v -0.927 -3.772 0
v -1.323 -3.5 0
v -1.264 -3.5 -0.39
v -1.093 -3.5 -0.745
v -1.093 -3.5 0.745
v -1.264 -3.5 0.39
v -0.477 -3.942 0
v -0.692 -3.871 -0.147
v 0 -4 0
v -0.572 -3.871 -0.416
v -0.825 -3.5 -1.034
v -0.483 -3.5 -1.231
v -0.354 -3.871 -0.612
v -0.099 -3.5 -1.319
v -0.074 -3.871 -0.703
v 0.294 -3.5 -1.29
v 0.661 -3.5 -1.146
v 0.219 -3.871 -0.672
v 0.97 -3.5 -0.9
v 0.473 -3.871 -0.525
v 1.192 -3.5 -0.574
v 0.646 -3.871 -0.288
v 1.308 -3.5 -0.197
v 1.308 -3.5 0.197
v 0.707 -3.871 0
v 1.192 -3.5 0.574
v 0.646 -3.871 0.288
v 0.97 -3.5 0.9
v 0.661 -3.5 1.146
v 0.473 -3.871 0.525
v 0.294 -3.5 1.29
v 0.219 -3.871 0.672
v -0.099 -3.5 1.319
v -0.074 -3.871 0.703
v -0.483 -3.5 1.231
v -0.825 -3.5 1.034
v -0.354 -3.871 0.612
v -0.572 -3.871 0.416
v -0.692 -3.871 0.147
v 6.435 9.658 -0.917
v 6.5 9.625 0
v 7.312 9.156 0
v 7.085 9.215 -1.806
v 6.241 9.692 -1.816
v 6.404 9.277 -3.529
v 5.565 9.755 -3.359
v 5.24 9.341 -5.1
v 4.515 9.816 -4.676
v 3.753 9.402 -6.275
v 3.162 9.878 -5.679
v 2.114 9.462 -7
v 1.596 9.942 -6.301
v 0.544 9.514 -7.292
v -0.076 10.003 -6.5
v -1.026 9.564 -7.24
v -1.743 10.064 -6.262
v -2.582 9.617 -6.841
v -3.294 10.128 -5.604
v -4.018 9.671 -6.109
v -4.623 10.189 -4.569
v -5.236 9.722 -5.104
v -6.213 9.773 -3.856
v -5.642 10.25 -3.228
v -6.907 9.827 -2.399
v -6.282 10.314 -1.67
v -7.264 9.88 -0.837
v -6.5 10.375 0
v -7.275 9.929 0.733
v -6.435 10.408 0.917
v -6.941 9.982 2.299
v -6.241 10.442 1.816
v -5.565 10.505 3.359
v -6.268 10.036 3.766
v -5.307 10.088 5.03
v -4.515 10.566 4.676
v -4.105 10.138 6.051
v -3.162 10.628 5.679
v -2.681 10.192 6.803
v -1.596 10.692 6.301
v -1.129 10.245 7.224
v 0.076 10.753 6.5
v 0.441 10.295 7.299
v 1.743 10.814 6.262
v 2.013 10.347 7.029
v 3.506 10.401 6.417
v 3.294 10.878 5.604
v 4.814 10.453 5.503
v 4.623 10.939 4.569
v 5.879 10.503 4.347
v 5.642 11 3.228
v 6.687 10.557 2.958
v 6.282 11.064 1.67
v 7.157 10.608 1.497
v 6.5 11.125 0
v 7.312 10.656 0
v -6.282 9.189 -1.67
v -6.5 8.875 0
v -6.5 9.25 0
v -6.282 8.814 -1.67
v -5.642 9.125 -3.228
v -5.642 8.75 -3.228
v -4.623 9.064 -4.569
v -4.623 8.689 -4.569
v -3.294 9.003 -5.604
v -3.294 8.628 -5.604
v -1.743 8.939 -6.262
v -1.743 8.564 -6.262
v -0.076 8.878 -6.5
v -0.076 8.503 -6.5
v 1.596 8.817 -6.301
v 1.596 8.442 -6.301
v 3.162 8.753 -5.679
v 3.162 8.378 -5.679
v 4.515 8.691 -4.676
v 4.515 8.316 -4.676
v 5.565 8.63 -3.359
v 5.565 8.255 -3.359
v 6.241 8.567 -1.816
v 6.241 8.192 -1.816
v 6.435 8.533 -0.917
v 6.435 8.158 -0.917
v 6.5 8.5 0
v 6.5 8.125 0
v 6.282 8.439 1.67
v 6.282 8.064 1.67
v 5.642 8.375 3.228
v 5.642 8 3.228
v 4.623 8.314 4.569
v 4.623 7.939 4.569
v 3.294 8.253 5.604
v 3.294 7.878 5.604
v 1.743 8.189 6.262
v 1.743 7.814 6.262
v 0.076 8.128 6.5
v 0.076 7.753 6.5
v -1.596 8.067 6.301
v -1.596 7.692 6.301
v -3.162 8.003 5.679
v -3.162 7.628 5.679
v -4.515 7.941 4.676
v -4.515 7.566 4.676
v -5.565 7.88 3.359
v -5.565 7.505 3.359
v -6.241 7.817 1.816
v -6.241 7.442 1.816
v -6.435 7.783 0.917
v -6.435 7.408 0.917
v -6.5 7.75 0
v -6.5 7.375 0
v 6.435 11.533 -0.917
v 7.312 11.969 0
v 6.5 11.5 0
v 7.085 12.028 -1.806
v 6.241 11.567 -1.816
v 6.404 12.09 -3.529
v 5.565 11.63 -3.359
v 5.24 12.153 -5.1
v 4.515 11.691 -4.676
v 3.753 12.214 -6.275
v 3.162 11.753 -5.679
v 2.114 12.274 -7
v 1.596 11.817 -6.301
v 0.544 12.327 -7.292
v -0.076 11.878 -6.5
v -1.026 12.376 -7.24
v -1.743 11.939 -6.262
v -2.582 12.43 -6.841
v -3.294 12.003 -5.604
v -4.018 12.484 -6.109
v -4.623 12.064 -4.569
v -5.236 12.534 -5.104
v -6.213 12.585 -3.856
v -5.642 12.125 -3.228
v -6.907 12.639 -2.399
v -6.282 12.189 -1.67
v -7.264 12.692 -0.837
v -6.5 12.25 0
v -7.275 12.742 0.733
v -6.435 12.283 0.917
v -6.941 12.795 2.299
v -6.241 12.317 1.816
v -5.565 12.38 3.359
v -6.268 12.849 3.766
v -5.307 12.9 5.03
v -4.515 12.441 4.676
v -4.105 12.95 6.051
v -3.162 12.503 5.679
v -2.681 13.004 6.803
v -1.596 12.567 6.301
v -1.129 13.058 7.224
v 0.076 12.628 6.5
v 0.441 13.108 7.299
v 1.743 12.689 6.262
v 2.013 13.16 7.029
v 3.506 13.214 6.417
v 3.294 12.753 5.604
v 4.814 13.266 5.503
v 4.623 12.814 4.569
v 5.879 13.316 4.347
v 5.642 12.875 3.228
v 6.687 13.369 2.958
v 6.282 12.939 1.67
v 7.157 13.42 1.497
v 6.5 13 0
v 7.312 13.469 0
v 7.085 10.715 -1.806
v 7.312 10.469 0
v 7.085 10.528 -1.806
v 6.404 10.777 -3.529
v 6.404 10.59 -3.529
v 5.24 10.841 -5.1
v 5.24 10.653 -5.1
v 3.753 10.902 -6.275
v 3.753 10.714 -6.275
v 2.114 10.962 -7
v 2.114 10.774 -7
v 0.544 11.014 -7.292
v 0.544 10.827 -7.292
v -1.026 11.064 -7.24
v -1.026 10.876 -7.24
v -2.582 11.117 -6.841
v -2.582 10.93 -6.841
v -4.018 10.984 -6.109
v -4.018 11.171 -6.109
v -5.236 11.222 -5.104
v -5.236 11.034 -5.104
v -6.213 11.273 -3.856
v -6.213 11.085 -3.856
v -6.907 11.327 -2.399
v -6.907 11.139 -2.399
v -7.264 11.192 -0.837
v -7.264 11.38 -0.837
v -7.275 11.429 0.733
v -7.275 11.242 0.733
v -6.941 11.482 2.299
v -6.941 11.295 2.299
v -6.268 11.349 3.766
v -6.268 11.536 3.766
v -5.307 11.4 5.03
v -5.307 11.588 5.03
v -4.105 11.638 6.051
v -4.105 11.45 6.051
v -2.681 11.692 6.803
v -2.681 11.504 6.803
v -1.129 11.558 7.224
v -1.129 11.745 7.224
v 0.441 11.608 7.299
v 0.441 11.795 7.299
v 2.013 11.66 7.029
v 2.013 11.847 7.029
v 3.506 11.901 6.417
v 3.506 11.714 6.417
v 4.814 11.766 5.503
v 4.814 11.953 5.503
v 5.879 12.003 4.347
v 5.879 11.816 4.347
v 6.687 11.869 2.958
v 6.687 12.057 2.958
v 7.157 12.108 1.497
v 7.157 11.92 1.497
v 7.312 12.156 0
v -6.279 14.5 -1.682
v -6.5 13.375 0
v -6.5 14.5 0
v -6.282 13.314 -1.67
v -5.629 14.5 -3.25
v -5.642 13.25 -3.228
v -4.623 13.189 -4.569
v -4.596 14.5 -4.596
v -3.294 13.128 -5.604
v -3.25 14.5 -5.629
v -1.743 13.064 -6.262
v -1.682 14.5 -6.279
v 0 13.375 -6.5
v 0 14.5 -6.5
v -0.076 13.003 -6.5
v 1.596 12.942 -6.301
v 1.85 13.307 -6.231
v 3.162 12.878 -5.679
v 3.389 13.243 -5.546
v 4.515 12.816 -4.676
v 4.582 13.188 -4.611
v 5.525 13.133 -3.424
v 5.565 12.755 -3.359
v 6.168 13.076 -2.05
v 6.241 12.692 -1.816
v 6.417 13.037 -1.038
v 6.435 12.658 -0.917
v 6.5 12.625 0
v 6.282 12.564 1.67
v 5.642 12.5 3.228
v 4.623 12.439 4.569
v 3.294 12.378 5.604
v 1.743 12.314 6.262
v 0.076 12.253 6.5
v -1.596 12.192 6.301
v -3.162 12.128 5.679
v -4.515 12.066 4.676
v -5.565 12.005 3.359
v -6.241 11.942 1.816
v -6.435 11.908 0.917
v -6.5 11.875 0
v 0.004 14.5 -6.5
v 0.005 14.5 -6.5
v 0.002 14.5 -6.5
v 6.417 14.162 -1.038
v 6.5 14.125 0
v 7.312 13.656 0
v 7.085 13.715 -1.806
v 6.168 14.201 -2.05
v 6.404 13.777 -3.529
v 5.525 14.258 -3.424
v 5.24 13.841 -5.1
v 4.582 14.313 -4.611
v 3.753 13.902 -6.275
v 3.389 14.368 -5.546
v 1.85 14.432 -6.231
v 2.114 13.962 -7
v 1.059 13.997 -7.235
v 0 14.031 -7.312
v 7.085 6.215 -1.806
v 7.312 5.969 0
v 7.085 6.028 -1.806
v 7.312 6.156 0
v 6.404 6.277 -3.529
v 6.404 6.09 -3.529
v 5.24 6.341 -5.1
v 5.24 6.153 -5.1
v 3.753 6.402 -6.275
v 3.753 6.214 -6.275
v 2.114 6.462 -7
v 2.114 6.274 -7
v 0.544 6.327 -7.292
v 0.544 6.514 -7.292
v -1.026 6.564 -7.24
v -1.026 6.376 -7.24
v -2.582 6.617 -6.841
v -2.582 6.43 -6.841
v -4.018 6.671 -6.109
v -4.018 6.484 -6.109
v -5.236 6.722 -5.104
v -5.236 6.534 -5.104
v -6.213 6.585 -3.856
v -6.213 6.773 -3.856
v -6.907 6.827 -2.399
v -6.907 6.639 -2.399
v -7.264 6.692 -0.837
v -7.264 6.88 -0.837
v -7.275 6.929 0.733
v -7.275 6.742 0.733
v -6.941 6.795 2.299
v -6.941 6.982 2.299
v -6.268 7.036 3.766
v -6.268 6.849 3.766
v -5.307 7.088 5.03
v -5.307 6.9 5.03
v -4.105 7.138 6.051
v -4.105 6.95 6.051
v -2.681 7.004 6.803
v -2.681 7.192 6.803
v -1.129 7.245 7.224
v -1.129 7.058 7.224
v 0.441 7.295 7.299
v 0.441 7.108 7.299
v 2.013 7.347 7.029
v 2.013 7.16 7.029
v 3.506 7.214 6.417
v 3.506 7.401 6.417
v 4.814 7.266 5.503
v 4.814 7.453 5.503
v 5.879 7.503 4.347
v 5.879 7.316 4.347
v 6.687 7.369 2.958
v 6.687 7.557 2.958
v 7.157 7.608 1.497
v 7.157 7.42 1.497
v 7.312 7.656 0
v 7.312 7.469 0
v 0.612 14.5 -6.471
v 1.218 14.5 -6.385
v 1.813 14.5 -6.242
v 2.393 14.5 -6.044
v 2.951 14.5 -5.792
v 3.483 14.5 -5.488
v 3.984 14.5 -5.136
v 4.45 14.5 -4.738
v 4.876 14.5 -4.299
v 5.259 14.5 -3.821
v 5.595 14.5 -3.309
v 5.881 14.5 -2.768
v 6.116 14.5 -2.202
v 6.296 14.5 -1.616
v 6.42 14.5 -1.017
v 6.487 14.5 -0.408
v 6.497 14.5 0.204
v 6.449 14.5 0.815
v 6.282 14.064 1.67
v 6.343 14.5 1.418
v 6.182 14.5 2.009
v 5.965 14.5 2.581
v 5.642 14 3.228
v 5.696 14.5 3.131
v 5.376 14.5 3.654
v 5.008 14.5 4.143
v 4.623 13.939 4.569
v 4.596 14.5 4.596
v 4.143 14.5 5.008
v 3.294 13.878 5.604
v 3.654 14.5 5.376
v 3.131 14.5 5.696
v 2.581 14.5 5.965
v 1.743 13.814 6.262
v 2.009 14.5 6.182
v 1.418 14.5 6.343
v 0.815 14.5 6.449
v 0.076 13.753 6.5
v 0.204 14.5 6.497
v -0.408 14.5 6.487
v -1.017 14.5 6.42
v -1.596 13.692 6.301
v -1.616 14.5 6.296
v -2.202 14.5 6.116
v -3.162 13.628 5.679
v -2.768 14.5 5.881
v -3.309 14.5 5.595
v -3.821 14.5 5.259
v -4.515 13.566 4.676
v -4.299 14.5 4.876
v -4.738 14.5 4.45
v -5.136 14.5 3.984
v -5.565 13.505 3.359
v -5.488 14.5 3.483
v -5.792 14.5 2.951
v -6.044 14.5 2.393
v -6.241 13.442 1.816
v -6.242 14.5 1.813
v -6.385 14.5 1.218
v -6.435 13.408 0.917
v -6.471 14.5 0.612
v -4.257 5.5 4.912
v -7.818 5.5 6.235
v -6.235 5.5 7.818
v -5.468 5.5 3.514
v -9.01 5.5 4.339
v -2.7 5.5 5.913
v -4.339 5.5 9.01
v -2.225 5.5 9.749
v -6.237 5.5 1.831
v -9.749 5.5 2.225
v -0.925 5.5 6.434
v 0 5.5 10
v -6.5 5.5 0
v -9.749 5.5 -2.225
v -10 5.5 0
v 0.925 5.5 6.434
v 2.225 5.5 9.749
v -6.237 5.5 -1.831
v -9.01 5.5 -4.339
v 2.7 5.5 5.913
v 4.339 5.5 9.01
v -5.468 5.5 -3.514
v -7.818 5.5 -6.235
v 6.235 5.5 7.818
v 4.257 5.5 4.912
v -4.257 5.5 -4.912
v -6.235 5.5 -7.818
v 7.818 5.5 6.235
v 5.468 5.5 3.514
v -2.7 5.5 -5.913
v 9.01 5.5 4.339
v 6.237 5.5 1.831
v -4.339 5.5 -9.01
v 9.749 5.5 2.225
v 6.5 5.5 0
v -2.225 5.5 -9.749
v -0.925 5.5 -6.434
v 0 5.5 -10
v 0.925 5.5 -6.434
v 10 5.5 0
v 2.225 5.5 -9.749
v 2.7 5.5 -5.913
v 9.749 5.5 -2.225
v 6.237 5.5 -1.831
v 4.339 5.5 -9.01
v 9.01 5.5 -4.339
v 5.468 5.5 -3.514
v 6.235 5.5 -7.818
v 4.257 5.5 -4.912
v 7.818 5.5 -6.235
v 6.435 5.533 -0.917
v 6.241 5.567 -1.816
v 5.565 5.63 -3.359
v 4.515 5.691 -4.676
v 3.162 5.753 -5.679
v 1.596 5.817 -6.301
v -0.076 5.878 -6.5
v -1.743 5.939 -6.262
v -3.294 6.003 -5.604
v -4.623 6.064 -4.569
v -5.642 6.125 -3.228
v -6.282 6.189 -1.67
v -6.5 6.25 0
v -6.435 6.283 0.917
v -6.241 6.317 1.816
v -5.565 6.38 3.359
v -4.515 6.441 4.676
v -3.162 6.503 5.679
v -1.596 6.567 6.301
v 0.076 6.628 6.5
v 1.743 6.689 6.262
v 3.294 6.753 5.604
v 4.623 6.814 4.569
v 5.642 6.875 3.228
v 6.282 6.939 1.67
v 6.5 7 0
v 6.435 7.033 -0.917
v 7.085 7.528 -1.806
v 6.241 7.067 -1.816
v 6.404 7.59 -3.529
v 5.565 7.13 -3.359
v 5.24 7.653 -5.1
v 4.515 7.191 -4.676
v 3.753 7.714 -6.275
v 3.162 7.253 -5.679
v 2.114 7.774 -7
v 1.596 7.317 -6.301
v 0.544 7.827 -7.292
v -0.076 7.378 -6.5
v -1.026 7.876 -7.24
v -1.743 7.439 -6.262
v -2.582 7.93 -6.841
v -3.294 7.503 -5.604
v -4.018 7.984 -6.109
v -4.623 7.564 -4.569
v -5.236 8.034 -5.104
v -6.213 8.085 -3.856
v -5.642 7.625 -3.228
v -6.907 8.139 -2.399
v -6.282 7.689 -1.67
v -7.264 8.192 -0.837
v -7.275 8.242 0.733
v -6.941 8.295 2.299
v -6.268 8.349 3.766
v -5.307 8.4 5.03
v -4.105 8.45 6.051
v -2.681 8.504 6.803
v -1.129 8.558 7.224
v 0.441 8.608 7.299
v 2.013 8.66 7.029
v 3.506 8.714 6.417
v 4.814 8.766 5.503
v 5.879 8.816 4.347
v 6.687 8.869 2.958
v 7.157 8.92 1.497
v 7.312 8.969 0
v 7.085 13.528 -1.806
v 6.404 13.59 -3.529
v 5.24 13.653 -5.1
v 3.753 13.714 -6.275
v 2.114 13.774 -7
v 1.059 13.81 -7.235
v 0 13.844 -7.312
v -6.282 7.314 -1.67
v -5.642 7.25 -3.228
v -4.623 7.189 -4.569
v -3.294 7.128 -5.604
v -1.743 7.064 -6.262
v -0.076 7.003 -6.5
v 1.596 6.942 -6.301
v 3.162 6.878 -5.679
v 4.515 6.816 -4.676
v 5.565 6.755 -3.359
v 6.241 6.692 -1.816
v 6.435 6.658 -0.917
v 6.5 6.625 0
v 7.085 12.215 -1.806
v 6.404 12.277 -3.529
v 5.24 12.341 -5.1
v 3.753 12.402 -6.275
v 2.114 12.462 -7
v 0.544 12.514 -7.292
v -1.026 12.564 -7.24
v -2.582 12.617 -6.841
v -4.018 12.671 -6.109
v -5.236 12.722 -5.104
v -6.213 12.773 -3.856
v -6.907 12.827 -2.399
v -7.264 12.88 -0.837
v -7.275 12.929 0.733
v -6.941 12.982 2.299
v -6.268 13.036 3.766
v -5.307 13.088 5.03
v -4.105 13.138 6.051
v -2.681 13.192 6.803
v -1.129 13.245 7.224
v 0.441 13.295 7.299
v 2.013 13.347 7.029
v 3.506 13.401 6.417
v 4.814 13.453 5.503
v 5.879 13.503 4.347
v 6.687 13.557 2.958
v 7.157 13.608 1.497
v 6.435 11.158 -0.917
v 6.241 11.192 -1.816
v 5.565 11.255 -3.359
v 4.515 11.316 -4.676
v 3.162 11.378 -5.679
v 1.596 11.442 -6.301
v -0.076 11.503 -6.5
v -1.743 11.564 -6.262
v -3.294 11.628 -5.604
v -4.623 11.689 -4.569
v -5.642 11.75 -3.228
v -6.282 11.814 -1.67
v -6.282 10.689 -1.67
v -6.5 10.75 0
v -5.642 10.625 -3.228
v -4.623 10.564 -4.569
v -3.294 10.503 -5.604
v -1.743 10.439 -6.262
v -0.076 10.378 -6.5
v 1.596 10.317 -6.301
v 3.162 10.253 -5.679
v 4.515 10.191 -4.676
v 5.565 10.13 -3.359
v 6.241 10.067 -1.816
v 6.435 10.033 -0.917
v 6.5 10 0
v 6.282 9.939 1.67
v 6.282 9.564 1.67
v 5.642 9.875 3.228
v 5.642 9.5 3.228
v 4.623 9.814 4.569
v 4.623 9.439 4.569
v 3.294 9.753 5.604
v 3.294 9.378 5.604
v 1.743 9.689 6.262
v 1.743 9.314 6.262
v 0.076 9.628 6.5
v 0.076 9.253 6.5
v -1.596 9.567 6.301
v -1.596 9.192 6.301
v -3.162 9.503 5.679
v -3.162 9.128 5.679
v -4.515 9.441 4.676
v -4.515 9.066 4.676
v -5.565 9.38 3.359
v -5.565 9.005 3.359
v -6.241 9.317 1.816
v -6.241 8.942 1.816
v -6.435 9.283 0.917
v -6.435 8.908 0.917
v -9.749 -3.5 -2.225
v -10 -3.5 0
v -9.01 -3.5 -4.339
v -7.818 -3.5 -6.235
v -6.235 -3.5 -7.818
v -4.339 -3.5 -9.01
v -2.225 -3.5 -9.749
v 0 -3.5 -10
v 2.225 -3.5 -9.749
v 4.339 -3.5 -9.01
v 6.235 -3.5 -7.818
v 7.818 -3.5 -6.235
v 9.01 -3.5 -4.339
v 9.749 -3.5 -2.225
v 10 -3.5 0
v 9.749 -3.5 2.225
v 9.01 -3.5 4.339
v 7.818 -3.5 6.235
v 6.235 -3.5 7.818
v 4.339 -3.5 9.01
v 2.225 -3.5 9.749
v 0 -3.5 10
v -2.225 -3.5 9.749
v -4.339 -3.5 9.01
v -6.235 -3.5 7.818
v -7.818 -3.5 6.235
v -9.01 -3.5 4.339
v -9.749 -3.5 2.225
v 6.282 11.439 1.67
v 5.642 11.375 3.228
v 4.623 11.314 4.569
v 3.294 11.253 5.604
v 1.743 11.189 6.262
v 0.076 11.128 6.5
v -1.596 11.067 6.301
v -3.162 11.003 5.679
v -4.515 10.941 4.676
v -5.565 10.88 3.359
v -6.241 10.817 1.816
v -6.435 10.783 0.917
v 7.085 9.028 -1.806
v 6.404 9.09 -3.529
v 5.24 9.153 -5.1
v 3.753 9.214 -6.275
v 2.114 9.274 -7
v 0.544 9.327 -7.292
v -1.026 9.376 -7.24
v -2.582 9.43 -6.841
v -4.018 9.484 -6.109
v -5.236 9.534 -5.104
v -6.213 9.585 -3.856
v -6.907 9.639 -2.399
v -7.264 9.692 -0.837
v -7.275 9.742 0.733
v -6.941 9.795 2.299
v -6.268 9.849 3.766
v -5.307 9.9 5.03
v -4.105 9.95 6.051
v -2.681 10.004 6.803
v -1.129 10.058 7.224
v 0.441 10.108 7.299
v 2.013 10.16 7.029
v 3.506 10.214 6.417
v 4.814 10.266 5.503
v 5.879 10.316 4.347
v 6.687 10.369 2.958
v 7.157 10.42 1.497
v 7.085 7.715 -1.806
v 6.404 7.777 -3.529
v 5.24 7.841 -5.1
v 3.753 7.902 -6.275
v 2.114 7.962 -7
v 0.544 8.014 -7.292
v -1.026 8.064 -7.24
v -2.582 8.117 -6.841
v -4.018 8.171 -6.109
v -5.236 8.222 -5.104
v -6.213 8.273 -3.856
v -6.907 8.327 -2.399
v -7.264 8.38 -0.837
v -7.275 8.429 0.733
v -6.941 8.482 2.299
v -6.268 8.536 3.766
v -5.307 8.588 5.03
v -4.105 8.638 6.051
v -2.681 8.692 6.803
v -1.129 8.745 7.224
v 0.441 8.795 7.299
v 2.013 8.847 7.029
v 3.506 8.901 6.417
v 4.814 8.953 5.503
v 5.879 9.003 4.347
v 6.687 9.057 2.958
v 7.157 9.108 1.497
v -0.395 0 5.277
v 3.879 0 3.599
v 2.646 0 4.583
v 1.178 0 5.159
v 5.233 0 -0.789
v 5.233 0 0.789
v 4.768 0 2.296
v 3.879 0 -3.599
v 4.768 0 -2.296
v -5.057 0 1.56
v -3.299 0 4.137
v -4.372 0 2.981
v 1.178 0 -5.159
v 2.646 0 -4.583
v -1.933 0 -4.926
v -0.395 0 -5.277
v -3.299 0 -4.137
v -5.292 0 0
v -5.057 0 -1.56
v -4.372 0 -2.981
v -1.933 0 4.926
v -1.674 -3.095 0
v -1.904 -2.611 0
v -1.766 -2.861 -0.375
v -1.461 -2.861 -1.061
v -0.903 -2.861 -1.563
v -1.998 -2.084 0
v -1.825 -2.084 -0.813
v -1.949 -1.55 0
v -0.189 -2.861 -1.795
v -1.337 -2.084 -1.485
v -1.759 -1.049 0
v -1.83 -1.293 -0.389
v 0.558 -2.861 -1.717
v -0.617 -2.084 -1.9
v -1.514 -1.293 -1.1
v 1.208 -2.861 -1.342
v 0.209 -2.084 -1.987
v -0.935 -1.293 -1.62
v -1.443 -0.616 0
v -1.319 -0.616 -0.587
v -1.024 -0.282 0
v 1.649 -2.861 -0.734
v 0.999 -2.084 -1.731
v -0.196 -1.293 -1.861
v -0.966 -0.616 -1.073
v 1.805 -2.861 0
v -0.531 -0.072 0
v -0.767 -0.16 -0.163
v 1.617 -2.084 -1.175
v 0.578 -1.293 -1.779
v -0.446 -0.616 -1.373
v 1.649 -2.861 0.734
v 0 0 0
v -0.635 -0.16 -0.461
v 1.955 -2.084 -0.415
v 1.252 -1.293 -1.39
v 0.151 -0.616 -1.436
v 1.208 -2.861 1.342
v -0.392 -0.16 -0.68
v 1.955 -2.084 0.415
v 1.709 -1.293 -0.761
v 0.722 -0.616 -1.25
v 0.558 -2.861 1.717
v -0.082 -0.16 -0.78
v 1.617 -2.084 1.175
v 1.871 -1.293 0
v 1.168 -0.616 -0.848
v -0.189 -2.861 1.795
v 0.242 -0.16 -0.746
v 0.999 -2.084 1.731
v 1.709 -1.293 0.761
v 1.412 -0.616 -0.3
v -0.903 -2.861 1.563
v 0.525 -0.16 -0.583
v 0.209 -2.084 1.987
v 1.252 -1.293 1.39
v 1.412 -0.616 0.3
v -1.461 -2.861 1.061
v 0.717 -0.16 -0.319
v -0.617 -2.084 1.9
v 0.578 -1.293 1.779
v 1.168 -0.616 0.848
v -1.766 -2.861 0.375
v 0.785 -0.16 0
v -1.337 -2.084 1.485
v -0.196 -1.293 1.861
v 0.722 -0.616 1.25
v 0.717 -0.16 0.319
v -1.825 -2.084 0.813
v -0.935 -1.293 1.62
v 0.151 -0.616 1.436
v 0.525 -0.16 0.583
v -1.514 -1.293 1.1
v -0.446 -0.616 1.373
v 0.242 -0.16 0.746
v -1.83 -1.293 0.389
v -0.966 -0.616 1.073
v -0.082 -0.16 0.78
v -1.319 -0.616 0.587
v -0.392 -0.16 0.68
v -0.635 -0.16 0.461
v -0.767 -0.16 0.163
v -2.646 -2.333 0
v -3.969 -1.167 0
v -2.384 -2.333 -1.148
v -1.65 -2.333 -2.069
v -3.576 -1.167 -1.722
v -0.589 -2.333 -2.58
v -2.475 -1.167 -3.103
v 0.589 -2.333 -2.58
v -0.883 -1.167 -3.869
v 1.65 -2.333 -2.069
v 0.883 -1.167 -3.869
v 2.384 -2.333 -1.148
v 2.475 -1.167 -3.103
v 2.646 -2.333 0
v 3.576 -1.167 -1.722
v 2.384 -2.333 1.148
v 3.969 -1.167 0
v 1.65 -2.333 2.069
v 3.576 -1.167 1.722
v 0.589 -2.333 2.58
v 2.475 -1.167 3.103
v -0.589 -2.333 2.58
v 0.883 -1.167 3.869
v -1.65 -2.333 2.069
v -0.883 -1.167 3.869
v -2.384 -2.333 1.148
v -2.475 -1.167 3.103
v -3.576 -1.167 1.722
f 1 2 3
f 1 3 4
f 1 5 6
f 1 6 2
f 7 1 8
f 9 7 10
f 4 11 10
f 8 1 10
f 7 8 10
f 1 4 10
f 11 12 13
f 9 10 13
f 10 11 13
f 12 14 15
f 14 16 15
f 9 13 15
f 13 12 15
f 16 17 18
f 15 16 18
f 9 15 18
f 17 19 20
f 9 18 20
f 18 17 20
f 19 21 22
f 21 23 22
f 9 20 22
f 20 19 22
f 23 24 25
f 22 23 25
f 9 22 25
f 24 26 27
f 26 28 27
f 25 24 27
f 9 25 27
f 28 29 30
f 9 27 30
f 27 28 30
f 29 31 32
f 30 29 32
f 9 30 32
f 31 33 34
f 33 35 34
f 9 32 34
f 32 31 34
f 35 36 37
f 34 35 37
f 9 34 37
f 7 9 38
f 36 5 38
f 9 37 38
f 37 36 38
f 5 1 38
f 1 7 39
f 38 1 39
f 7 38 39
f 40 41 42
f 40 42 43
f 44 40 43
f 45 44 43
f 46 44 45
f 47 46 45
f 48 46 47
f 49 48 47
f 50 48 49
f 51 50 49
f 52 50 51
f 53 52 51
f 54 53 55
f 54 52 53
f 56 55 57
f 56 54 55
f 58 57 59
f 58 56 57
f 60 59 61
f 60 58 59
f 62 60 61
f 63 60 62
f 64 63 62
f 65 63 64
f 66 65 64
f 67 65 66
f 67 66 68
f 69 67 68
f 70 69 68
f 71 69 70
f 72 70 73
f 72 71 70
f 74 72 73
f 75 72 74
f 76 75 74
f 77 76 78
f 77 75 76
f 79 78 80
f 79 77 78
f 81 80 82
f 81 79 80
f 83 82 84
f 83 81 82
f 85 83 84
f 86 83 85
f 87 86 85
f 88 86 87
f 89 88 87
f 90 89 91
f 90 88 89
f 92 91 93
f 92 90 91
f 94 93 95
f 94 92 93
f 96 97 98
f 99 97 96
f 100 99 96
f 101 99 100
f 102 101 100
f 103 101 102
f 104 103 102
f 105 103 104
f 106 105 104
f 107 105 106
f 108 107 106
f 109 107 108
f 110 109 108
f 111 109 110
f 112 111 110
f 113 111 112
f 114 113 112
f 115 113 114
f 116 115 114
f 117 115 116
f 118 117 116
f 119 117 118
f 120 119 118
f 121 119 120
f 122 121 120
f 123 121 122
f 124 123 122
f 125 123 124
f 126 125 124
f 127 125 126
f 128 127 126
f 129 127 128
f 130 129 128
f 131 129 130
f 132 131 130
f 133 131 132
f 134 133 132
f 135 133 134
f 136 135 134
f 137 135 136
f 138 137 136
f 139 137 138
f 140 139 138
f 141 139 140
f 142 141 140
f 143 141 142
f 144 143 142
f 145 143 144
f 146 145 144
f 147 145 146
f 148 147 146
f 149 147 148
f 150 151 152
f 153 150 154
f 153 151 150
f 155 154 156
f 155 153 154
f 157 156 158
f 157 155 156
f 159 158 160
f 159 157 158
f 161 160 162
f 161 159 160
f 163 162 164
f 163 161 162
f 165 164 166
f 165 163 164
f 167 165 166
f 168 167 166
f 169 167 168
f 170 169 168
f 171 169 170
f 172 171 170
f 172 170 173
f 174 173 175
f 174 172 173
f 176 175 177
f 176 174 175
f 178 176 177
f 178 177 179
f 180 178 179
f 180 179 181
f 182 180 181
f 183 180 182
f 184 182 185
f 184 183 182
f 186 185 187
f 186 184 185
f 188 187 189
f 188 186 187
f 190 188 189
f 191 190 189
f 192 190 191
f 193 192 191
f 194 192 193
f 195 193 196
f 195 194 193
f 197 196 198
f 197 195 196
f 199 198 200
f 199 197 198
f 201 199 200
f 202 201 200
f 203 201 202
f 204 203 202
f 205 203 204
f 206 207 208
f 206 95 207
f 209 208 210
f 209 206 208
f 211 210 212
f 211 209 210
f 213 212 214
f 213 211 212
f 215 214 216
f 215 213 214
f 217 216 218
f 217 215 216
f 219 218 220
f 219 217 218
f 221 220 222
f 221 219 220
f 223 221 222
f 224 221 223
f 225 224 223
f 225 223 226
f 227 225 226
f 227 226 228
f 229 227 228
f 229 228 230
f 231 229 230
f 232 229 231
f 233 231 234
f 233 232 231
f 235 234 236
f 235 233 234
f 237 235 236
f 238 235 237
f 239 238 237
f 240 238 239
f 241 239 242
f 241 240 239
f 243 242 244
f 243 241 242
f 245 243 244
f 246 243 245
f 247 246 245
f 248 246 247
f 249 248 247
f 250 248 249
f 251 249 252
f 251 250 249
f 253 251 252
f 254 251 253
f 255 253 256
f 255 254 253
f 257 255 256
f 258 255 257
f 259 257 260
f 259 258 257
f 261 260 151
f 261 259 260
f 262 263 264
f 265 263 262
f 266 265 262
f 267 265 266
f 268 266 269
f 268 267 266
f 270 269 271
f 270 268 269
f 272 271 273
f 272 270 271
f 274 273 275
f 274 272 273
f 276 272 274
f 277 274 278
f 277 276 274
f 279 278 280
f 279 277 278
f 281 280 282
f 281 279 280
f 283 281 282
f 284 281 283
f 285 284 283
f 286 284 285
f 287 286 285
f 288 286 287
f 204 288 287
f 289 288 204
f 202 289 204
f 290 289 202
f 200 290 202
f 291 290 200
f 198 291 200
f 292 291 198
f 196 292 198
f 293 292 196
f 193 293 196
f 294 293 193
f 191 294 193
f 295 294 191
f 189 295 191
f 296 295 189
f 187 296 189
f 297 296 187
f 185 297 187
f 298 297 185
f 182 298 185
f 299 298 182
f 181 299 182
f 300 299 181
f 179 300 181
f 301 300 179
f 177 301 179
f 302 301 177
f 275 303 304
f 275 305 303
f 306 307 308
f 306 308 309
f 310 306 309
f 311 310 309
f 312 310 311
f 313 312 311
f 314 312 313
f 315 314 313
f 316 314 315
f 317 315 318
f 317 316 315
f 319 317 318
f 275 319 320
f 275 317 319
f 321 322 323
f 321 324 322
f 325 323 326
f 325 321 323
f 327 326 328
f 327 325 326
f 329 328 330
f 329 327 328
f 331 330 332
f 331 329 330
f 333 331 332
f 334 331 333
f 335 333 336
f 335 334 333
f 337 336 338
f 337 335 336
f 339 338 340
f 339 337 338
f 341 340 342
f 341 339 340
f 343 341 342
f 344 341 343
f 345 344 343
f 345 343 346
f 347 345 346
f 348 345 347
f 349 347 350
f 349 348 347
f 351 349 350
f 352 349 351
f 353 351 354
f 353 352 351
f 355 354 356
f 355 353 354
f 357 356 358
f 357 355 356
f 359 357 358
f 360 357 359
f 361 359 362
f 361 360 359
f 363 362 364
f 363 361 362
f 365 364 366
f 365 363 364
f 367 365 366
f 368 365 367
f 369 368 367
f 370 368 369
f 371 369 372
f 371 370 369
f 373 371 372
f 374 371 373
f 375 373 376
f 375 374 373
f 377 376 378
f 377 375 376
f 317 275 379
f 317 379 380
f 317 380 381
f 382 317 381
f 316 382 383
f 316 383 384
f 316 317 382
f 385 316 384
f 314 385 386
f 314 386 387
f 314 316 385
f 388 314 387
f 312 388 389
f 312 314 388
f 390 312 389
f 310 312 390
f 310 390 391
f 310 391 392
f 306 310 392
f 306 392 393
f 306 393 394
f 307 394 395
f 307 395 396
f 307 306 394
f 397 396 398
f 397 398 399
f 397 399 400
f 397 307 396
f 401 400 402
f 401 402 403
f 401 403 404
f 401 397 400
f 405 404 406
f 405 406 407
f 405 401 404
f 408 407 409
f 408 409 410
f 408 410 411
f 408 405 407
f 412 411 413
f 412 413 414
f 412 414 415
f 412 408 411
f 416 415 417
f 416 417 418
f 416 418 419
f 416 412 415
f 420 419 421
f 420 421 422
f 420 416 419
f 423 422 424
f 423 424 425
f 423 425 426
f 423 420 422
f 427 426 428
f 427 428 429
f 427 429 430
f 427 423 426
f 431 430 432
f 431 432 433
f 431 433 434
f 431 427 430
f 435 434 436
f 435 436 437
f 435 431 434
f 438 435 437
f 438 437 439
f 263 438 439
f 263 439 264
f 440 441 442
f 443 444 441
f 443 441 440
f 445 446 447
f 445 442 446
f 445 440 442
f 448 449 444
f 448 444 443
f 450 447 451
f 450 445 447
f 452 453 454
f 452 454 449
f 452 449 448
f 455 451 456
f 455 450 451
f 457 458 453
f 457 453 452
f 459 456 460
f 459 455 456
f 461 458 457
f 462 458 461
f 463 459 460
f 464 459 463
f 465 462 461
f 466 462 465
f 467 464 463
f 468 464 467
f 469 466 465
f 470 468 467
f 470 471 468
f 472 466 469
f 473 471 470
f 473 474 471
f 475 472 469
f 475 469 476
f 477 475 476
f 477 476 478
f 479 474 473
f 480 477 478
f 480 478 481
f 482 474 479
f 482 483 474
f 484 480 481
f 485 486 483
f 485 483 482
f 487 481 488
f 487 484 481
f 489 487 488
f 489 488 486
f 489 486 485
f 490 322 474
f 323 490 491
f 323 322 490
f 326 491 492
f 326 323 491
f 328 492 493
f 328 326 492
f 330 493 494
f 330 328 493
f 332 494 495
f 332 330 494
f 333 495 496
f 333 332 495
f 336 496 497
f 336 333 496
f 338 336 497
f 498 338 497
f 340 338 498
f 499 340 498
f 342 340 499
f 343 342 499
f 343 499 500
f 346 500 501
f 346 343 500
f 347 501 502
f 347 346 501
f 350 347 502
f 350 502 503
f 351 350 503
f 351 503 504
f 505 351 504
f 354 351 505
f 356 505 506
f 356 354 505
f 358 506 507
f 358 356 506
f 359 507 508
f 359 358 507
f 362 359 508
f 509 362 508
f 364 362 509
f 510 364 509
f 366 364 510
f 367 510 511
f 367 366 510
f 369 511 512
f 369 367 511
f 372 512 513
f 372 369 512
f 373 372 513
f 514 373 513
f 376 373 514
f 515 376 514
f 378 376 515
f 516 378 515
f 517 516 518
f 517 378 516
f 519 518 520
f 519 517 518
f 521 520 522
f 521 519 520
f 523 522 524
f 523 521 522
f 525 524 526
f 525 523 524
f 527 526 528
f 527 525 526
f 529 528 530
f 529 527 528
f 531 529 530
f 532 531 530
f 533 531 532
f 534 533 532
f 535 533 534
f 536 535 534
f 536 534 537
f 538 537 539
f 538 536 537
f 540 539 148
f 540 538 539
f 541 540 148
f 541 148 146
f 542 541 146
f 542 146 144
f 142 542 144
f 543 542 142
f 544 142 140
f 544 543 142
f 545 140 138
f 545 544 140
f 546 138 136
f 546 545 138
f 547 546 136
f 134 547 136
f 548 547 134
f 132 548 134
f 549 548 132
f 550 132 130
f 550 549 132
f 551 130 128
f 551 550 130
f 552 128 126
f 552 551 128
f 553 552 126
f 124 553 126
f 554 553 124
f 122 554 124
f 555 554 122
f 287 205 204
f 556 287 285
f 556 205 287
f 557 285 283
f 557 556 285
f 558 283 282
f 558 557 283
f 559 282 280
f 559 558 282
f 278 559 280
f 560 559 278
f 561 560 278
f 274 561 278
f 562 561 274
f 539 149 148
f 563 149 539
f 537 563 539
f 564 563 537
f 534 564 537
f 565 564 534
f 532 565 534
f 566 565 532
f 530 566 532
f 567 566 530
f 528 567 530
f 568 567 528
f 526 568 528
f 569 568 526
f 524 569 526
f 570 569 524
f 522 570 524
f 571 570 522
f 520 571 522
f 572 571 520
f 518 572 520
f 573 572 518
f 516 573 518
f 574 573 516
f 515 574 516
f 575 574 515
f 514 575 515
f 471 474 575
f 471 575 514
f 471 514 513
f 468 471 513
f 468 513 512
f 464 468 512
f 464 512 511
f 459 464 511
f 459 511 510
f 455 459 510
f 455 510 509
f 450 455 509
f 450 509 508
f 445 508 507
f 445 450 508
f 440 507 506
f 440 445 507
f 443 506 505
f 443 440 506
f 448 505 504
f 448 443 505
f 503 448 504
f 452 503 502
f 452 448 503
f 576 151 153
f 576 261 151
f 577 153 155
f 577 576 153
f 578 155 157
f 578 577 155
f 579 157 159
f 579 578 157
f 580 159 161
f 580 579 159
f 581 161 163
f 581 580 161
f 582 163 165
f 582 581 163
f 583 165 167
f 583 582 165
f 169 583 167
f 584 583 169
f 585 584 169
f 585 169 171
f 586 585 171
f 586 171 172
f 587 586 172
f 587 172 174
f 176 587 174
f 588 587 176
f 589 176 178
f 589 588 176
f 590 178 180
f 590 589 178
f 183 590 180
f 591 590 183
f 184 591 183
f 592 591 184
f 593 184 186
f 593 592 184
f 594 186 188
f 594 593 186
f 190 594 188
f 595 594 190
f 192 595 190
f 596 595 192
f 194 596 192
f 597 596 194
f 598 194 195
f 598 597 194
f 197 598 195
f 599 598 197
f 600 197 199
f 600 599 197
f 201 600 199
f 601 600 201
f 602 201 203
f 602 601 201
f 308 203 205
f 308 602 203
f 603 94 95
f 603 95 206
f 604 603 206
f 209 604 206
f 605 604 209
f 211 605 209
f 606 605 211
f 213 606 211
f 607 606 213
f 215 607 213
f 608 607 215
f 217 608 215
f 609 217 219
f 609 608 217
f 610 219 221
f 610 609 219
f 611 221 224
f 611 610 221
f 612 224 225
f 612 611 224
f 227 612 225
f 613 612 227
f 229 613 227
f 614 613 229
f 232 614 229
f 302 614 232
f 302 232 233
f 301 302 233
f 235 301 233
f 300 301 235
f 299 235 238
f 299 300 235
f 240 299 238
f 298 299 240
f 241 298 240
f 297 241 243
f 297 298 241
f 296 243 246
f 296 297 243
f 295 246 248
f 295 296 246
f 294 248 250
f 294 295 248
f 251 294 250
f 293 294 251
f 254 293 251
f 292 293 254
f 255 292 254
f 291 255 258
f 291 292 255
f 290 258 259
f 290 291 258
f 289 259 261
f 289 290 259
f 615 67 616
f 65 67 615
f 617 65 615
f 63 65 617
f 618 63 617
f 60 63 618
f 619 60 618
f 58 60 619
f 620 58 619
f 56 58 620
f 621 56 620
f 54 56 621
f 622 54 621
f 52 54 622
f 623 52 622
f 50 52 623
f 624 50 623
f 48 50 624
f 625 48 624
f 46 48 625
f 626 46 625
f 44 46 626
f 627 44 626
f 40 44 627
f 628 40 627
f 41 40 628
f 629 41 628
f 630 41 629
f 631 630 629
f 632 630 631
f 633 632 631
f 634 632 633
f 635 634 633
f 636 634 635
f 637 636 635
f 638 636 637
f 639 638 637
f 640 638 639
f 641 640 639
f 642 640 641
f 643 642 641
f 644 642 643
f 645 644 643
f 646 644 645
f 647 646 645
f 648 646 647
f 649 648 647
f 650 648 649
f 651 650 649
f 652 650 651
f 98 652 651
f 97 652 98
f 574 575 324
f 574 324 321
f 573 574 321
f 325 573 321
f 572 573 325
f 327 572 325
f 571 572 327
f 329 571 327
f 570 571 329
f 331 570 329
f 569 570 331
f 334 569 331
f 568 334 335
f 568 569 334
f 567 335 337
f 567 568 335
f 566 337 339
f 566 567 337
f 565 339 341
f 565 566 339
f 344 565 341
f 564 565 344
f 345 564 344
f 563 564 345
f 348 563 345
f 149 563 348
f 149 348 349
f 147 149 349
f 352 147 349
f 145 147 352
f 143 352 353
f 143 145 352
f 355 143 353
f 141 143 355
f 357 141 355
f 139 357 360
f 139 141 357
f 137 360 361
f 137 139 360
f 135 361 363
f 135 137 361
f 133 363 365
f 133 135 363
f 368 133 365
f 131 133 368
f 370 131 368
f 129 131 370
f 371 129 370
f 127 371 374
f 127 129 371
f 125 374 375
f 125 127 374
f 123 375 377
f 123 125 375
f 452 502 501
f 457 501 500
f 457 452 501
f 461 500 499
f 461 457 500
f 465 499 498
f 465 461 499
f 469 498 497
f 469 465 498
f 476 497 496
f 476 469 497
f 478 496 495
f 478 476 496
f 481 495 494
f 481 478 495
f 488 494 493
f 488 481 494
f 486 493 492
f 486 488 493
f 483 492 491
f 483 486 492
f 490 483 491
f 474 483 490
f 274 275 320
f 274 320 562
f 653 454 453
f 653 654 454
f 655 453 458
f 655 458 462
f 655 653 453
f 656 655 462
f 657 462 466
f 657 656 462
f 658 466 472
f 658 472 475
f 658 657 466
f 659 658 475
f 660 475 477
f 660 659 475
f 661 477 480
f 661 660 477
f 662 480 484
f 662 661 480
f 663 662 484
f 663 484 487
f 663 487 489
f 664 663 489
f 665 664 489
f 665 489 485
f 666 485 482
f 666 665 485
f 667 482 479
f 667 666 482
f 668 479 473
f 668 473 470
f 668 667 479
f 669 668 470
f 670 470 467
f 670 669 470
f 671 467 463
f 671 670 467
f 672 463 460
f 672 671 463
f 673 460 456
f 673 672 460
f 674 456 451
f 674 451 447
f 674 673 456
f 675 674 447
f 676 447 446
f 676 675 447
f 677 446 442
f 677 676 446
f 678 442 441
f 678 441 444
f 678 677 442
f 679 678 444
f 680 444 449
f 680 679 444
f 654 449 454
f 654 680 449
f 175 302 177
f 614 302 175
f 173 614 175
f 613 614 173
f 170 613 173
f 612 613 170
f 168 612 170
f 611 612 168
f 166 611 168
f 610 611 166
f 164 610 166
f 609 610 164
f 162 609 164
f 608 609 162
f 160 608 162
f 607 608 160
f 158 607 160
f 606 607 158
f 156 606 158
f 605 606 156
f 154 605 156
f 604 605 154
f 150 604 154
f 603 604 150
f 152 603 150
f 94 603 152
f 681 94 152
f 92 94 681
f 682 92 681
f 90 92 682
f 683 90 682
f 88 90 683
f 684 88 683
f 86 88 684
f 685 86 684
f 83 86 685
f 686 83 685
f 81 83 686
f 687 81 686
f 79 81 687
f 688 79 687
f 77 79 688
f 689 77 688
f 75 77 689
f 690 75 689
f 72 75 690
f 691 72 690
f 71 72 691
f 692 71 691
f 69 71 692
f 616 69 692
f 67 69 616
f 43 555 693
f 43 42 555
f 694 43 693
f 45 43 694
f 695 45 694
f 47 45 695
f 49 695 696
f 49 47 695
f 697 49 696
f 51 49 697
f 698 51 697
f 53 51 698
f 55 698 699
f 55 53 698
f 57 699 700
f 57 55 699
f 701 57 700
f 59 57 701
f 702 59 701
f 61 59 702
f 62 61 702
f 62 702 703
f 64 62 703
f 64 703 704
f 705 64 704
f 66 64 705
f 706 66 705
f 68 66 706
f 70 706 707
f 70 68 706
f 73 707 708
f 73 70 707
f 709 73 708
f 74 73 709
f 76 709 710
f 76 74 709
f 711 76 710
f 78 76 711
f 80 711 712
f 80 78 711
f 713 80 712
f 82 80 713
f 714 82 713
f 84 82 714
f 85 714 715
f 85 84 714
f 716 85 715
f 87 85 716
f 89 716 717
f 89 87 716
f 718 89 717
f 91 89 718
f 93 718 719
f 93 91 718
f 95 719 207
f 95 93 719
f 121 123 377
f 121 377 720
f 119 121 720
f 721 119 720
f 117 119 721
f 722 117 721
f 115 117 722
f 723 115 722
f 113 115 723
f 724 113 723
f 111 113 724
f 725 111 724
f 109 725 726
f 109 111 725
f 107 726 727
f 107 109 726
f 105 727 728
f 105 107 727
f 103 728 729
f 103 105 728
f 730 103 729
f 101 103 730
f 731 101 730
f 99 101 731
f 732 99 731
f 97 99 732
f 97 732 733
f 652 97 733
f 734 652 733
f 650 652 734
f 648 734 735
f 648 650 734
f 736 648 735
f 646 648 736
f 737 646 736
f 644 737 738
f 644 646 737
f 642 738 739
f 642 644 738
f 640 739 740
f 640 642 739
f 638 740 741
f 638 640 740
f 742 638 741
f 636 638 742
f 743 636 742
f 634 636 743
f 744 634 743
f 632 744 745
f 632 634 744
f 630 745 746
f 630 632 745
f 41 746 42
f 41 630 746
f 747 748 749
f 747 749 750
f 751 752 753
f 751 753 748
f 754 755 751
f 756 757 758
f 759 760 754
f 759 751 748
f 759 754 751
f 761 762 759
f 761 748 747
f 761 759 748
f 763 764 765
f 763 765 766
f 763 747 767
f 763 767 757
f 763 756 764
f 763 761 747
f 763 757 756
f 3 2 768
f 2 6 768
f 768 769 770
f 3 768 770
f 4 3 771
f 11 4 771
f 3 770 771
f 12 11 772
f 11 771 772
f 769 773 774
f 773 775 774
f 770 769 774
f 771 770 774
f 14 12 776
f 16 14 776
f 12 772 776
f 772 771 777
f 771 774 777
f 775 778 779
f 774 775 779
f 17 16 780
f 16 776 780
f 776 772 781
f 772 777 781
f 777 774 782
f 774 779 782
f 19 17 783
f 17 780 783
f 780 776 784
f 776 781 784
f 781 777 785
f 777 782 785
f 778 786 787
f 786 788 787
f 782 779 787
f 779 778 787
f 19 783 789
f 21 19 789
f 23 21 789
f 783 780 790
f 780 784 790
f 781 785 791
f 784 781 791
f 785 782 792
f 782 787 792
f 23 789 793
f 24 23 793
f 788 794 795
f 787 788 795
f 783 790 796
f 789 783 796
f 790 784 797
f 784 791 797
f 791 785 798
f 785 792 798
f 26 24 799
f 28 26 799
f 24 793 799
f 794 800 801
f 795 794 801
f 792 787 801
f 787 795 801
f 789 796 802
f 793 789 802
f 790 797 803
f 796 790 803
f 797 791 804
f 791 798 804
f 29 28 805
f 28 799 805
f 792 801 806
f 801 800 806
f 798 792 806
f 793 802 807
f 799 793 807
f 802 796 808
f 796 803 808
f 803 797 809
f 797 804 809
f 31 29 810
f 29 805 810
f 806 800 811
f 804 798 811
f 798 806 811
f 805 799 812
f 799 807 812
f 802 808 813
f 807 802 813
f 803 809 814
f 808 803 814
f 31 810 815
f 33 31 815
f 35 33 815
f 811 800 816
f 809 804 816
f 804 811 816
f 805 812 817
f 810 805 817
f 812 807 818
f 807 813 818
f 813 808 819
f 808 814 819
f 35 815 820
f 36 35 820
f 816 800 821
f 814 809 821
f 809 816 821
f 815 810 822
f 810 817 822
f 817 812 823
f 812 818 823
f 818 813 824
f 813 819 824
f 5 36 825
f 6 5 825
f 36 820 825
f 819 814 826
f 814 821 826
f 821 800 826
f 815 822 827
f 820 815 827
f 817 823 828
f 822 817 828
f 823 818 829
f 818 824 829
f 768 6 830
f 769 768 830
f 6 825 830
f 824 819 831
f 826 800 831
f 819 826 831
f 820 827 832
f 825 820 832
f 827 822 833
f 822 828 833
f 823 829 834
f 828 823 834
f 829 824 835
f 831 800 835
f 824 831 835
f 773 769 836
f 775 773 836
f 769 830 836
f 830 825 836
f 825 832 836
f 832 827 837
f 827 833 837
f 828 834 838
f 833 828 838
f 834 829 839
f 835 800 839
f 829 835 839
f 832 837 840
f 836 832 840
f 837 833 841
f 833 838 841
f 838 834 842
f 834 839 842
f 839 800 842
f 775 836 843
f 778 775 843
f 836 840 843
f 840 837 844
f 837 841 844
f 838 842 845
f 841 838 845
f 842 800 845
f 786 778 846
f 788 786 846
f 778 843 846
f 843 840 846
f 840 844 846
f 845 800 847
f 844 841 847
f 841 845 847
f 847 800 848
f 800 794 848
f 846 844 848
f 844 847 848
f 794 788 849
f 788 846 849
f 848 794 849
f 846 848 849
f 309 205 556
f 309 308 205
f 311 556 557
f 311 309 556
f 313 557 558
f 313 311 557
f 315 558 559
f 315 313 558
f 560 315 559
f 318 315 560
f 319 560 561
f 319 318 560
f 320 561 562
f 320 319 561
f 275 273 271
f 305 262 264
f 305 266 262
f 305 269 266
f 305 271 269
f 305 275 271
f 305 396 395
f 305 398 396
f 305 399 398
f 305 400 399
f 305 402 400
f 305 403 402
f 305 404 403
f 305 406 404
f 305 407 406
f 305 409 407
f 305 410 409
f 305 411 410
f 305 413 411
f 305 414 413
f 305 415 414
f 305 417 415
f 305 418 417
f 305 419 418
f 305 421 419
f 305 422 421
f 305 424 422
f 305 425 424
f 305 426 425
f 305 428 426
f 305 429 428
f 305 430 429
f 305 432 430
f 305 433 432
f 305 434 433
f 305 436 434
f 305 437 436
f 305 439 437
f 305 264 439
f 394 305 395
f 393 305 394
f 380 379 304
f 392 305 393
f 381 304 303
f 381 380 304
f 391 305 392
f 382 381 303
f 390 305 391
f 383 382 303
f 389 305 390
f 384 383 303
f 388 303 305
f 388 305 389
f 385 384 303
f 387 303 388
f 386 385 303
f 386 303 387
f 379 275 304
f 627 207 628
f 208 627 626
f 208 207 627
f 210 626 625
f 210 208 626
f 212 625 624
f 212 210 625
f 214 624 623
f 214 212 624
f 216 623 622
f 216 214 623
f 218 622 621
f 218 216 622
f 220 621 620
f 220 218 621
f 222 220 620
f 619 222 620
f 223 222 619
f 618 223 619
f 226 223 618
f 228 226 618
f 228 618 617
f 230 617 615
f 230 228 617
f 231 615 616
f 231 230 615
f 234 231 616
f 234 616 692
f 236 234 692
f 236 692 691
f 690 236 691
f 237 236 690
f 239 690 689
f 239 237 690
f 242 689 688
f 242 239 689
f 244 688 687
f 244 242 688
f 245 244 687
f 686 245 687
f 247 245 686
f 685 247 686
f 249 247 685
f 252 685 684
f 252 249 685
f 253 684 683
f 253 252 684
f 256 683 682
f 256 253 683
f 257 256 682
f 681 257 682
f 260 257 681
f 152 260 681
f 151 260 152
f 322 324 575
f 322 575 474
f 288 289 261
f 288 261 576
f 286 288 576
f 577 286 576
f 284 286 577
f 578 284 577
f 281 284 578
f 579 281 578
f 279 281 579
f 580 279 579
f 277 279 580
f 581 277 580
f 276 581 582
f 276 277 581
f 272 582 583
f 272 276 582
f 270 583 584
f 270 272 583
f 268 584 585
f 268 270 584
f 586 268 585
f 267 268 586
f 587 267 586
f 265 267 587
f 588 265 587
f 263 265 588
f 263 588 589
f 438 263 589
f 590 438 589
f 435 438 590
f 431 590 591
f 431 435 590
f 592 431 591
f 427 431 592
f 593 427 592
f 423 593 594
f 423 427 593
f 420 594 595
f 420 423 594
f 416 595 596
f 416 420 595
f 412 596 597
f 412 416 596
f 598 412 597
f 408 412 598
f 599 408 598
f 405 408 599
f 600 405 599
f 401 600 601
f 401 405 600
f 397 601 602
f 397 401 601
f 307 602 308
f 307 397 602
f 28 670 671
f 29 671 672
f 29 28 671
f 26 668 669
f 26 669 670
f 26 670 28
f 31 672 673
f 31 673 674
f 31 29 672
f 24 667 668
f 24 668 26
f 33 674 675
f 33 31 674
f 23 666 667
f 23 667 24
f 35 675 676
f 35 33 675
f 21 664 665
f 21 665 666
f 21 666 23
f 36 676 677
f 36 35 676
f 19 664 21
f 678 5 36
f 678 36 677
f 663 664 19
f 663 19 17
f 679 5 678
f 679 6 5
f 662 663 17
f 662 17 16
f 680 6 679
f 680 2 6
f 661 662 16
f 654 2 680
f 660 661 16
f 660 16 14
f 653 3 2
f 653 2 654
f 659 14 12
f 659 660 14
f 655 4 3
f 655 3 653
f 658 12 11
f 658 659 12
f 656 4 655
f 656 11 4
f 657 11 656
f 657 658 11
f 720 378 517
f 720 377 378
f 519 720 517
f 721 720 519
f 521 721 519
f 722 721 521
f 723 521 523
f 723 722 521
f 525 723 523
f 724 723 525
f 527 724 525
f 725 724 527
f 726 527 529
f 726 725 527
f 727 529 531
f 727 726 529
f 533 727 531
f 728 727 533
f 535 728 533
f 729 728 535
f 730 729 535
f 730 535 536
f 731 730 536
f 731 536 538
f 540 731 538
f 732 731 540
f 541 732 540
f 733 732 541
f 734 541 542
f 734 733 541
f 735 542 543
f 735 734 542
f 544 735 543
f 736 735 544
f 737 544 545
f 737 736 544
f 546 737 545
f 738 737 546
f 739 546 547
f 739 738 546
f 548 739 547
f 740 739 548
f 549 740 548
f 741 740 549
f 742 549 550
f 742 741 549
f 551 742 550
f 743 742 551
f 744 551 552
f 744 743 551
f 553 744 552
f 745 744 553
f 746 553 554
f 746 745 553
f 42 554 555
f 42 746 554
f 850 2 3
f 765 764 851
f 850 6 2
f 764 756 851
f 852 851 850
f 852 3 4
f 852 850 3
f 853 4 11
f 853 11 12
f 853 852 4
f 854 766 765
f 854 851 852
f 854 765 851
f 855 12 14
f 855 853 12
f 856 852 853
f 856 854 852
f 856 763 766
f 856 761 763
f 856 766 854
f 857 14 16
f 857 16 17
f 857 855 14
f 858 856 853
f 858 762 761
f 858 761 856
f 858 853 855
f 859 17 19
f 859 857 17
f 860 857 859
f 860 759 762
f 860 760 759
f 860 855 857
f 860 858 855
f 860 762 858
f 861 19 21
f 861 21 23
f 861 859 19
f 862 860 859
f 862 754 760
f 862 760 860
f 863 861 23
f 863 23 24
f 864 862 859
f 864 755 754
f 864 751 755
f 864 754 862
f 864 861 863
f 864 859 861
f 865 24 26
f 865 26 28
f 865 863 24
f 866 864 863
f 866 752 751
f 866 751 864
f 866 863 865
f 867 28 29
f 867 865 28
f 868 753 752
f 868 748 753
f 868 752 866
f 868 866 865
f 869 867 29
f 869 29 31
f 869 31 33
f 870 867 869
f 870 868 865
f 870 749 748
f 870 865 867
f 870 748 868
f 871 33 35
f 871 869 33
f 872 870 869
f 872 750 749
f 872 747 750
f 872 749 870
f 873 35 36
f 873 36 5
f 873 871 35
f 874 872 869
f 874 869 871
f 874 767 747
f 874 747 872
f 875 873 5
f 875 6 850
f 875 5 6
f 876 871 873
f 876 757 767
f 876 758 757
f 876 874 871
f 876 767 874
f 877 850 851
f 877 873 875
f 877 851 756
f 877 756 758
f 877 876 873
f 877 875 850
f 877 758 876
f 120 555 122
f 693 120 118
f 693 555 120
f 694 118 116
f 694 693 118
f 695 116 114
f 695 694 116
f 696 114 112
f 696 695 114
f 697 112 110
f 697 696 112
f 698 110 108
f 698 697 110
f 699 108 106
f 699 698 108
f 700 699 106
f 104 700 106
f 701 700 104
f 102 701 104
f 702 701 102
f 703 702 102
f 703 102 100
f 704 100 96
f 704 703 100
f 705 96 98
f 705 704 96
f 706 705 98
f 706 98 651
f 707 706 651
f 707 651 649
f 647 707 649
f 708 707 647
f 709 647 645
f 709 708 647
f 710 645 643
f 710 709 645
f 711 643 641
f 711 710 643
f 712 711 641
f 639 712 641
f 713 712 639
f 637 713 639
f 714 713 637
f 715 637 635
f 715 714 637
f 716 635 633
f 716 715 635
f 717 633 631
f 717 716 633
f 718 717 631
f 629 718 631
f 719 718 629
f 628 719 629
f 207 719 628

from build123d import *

# Parameters (mm, degrees)
THREAD_2_PITCH = 1.5


with BuildPart() as part:
    # Sketch 2 → Повернуть1 (revolve)
    with BuildSketch(Plane.XY):
        Polygon((-1.322875657, -3.5), (-5.291764647, 0), (0, 0), (0, 14.5), (-6.5, 14.5), (-6.5, 5.5), (-10, 5.5), (-10, -3.5), align=None)
        with BuildLine():
            Line((0, 0), (0, -4))
            ThreePointArc((0, -4), (-2, -2), (0, 0))
        make_face()
    revolve(axis=Axis((0, 0, 0), (0, -1, 0)))

    # Резьба2: the profile of Sketch 2 2 profile screwed along a right-hand helix of 5.25 turns, 8 arcs to a turn; built about Z, then put on its axis
    thread_2_z = Axis((0, 0, 0), (0, 0, 1))
    thread_2_corners = [(6.4997, 0, -0.000173205), (7.311898812, 0, 0.468749998), (7.311898812, 0, 0.656249998), (6.4997, 0, 1.125173201)]
    with BuildLine(mode=Mode.PRIVATE) as thread_2_profile:
        Line(thread_2_corners[0], thread_2_corners[1])
        Line(thread_2_corners[1], thread_2_corners[2])
        Line(thread_2_corners[2], thread_2_corners[3])
        Line(thread_2_corners[3], thread_2_corners[0])
    thread_2_cap = Face(thread_2_profile.wire())
    thread_2_turn_angles = [0, 22.5, 45, 67.5, 90, 112.5, 135, 157.5, 180, 202.5, 225, 247.5, 270, 292.5, 315, 337.5, 360]
    thread_2_turn_weights = [1, 0.9238795325112867, 1, 0.9238795325112867, 1, 0.9238795325112867, 1, 0.9238795325112867, 1, 0.9238795325112867, 1, 0.9238795325112867, 1, 0.9238795325112867, 1, 0.9238795325112867, 1]
    thread_2_turn_rails = [Edge.make_bspline([Vector(p[0], p[1], 0).rotate(thread_2_z, thread_2_turn_angles[k]) / thread_2_turn_weights[k] + Vector(0, 0, p[2] + THREAD_2_PITCH * thread_2_turn_angles[k] / 360) for k in range(17)], [0, 0, 0, 1, 1, 2, 2, 3, 3, 4, 4, 5, 5, 6, 6, 7, 7, 8, 8, 8], 2, thread_2_turn_weights) for p in thread_2_corners]
    thread_2_turn_sides = [Face.make_surface_from_curves(thread_2_turn_rails[p[0]], thread_2_turn_rails[p[1]]) for p in [(0, 1), (1, 2), (2, 3), (3, 0)]]
    thread_2_last_angles = [1800, 1822.5, 1845, 1867.5, 1890]
    thread_2_last_weights = [1, 0.9238795325112867, 1, 0.9238795325112867, 1]
    thread_2_last_rails = [Edge.make_bspline([Vector(p[0], p[1], 0).rotate(thread_2_z, thread_2_last_angles[k]) / thread_2_last_weights[k] + Vector(0, 0, p[2] + THREAD_2_PITCH * thread_2_last_angles[k] / 360) for k in range(5)], [0, 0, 0, 1, 1, 2, 2, 2], 2, thread_2_last_weights) for p in thread_2_corners]
    thread_2_last_sides = [Face.make_surface_from_curves(thread_2_last_rails[p[0]], thread_2_last_rails[p[1]]) for p in [(0, 1), (1, 2), (2, 3), (3, 0)]]
    thread_2 = Plane(origin=(0, 5.5, 0), x_dir=(1, 0, 0), z_dir=(0, 1, 0)) * Solid(Shell([*[p.moved(Location((0, 0, THREAD_2_PITCH * i))) for i in range(5) for p in thread_2_turn_sides], *thread_2_last_sides, thread_2_cap, thread_2_cap.rotate(thread_2_z, 1890).moved(Location((0, 0, THREAD_2_PITCH * 1890 / 360)))]))
    add(thread_2)


solid = part.part
